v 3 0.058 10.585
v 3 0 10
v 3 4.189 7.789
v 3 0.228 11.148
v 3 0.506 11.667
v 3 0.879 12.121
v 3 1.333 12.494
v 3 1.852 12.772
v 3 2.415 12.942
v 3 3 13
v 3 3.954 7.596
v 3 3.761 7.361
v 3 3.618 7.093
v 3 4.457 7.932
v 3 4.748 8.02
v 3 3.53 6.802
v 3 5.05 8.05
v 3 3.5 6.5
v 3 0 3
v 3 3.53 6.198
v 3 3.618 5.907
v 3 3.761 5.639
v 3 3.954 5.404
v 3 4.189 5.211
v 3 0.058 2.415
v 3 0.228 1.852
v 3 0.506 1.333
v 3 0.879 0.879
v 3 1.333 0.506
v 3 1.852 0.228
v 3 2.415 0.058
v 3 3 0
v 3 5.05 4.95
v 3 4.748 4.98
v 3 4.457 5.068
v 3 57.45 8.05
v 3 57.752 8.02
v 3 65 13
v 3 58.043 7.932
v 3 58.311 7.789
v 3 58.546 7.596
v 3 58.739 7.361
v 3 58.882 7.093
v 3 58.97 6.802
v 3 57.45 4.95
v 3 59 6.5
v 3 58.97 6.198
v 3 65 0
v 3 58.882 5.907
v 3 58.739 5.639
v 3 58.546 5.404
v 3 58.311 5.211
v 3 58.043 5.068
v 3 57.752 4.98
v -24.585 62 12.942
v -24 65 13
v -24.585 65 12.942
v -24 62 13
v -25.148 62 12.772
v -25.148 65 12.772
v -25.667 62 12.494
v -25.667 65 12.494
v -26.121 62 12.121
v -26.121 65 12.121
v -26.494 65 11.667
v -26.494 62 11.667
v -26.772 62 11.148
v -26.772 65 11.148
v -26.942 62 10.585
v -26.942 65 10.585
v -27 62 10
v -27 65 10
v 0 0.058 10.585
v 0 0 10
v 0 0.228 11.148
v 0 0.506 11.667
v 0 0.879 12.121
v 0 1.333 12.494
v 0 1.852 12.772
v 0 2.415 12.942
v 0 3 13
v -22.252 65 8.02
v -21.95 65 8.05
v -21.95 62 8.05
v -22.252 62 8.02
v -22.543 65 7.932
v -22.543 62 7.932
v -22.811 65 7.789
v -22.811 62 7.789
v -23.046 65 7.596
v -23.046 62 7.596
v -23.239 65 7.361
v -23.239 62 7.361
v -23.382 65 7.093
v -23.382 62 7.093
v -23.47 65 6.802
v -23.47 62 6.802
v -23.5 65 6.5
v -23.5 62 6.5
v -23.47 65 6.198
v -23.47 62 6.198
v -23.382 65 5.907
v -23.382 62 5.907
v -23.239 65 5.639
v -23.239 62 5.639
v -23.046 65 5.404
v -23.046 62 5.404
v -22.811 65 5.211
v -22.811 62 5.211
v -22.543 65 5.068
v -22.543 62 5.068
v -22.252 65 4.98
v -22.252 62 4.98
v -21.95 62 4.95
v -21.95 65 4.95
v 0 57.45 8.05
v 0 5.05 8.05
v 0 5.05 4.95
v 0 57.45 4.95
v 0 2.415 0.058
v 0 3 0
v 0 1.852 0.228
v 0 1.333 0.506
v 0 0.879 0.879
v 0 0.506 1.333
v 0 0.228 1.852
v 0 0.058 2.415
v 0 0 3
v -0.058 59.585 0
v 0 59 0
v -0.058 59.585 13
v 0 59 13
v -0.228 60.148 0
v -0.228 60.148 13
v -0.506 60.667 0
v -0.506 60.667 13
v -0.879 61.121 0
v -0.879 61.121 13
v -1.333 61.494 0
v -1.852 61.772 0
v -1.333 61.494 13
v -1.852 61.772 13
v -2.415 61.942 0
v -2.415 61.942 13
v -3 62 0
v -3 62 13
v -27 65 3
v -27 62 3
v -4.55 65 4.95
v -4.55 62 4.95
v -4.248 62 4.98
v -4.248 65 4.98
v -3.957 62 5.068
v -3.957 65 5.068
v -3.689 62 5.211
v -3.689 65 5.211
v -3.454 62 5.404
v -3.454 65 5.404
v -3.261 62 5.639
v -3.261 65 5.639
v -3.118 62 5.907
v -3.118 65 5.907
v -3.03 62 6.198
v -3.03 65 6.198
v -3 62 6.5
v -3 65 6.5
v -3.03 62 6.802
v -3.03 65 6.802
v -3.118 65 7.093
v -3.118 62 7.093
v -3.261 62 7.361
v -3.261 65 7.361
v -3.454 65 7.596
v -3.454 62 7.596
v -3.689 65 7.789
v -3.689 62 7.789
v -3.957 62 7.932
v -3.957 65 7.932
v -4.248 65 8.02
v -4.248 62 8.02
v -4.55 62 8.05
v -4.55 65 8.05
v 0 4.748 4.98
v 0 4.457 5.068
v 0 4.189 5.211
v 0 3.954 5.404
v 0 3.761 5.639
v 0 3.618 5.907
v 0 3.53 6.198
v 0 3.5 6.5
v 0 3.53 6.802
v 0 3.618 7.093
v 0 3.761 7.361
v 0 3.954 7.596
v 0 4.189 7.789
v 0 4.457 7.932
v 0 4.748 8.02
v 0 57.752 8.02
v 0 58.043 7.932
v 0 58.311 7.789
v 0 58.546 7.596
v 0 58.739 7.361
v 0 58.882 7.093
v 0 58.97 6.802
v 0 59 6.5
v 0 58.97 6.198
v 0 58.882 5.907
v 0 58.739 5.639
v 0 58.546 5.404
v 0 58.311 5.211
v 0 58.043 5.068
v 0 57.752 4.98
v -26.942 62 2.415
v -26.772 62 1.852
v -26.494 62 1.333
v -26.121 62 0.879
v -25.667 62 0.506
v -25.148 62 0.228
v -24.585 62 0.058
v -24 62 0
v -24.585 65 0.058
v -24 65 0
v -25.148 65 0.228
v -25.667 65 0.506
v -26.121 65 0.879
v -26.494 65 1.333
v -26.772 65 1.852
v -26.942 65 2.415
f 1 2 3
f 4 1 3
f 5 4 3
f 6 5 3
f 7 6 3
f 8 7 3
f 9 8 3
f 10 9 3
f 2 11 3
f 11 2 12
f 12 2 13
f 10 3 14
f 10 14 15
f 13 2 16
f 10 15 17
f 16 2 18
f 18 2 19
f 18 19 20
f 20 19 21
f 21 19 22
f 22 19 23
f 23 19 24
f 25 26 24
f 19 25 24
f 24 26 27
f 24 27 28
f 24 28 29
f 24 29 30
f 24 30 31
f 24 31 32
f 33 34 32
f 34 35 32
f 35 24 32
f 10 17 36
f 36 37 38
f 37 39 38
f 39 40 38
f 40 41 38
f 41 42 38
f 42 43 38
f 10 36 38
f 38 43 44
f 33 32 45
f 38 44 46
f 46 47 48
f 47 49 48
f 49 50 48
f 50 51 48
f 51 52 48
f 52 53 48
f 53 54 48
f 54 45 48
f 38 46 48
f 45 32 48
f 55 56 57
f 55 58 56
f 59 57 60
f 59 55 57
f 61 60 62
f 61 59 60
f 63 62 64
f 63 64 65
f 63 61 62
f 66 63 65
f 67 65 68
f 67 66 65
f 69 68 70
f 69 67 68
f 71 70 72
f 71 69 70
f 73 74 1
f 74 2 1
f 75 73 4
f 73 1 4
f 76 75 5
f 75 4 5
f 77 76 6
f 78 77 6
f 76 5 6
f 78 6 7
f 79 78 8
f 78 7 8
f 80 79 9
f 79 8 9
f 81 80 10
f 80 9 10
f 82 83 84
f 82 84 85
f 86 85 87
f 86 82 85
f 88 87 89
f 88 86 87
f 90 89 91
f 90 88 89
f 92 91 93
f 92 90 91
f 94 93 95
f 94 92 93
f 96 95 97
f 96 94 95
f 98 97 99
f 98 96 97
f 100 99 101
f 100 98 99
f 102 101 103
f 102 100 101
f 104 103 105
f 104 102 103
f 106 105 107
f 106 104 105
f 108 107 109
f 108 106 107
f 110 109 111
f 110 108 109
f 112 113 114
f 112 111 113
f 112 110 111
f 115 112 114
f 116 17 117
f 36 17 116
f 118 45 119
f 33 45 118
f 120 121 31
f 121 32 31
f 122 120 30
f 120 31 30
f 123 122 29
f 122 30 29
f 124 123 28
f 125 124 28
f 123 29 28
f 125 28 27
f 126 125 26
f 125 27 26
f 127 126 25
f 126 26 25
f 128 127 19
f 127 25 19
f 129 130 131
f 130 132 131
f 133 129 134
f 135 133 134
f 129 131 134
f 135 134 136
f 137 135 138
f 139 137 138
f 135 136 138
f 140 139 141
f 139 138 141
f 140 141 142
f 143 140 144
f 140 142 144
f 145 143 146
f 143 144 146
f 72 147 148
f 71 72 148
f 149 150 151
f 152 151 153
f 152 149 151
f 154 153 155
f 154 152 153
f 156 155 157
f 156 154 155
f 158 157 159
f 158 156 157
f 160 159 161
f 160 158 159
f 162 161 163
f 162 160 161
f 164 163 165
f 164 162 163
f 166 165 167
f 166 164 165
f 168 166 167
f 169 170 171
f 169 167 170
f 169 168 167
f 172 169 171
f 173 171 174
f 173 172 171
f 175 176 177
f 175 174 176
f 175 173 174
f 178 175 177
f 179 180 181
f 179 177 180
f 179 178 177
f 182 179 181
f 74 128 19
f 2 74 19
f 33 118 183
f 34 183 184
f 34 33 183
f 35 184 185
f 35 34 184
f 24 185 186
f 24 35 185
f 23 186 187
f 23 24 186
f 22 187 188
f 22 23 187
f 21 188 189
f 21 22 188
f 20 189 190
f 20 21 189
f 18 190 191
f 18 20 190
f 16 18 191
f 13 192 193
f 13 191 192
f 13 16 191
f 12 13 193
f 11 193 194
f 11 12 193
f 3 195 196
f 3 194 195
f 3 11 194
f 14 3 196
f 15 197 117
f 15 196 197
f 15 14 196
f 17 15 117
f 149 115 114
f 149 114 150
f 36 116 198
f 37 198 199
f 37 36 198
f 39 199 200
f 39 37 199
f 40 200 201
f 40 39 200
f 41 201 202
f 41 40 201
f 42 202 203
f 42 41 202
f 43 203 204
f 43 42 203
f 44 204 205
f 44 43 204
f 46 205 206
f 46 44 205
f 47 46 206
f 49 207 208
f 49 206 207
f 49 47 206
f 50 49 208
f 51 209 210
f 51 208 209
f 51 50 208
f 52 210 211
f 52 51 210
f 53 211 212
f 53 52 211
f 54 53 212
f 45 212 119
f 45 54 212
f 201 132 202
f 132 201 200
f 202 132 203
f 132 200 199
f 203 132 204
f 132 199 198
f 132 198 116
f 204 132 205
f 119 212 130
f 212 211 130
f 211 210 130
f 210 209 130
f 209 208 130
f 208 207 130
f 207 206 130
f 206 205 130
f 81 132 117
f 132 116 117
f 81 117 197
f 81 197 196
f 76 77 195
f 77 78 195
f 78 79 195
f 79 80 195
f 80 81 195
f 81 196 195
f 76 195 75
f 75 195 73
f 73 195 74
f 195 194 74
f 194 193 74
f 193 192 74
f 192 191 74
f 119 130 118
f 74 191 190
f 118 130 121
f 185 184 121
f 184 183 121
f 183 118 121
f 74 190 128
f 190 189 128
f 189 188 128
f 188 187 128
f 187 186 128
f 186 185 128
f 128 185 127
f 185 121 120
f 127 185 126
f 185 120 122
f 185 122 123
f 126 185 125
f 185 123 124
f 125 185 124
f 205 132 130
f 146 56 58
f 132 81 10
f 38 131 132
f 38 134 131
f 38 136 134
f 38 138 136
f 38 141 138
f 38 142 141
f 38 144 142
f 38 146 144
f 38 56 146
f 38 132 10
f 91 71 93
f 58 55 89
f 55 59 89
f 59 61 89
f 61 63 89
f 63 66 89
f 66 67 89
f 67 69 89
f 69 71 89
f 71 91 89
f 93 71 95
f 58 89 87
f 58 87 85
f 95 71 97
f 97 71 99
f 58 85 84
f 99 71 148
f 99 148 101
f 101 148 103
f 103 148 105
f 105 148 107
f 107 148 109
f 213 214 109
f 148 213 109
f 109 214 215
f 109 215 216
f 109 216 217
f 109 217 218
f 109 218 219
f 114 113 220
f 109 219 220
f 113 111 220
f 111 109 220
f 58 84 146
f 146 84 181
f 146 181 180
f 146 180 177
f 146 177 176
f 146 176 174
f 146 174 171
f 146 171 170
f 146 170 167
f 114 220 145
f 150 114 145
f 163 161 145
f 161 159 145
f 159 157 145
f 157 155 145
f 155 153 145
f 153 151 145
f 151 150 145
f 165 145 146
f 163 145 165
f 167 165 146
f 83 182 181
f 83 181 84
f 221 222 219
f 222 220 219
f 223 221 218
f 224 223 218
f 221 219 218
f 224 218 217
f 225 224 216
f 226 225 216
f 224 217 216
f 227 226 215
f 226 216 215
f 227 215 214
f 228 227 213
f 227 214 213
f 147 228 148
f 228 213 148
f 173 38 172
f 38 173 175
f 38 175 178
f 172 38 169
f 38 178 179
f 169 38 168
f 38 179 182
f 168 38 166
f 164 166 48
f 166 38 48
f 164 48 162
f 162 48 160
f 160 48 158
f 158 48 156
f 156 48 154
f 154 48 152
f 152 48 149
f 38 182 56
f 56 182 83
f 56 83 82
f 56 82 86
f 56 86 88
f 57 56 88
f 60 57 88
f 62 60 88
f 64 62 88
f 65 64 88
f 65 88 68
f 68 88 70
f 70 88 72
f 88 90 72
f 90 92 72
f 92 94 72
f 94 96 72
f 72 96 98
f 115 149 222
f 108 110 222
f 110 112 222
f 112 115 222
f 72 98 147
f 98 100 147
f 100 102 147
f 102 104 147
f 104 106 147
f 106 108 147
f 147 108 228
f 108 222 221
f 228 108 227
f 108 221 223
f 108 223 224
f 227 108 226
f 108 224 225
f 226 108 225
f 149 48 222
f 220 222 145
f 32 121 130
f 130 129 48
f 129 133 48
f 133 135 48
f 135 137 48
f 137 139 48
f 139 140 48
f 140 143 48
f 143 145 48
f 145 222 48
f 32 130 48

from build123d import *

# Parameters (mm, degrees)
BOSS_EXTRUDE1_DEPTH = 13
CUT_EXTRUDE1_DEPTH  = 73.759879054
CUT_EXTRUDE2_DEPTH  = 72.575135347
FILLET1_R           = 3
FILLET2_R           = 3


with BuildPart() as part:
    # Sketch1 → Boss-Extrude1 (new body)
    with BuildSketch(Plane.XY):
        Polygon((0, 0), (3, 0), (3, 65), (-27, 65), (-27, 62), (0, 62), align=None)
    extrude(amount=BOSS_EXTRUDE1_DEPTH)

    # Sketch6 → Cut-Extrude1 (cut, through all)
    with BuildSketch(Plane(origin=(3, 0, 0), x_dir=(0, 0, -1), z_dir=(1, 0, 0))):
        with BuildLine():
            Line((-4.95, 57.45), (-4.95, 5.05))
            ThreePointArc((-4.95, 5.05), (-6.5, 3.5), (-8.05, 5.05))
            Line((-8.05, 5.05), (-8.05, 57.45))
            ThreePointArc((-8.05, 57.45), (-6.5, 59), (-4.95, 57.45))
        make_face()
    extrude(amount=-CUT_EXTRUDE1_DEPTH, mode=Mode.SUBTRACT)

    # Sketch7 → Cut-Extrude2 (cut, through all)
    with BuildSketch(Plane(origin=(0, 65, 0), x_dir=(1, 0, 0), z_dir=(0, 1, 0))):
        with BuildLine():
            Line((-21.95, -4.95), (-4.55, -4.95))
            ThreePointArc((-4.55, -4.95), (-3, -6.5), (-4.55, -8.05))
            Line((-4.55, -8.05), (-21.95, -8.05))
            ThreePointArc((-21.95, -8.05), (-23.5, -6.5), (-21.95, -4.95))
        make_face()
    extrude(amount=-CUT_EXTRUDE2_DEPTH, mode=Mode.SUBTRACT)

    # Fillet1
    fillet1_edges = [part.edges().sort_by_distance(p)[0] for p in [
        (0, 62, 6.5),
    ]]
    fillet(fillet1_edges, radius=FILLET1_R - 0.0001)  # a hair under: the kernel refuses the full size

    # Fillet2
    fillet2_edges = [part.edges().sort_by_distance(p)[0] for p in [
        (-27, 63.5, 13),
        (-27, 63.5, 0),
        (1.5, 0, 0),
        (1.5, 0, 13),
    ]]
    fillet(fillet2_edges, radius=FILLET2_R)


solid = part.part
